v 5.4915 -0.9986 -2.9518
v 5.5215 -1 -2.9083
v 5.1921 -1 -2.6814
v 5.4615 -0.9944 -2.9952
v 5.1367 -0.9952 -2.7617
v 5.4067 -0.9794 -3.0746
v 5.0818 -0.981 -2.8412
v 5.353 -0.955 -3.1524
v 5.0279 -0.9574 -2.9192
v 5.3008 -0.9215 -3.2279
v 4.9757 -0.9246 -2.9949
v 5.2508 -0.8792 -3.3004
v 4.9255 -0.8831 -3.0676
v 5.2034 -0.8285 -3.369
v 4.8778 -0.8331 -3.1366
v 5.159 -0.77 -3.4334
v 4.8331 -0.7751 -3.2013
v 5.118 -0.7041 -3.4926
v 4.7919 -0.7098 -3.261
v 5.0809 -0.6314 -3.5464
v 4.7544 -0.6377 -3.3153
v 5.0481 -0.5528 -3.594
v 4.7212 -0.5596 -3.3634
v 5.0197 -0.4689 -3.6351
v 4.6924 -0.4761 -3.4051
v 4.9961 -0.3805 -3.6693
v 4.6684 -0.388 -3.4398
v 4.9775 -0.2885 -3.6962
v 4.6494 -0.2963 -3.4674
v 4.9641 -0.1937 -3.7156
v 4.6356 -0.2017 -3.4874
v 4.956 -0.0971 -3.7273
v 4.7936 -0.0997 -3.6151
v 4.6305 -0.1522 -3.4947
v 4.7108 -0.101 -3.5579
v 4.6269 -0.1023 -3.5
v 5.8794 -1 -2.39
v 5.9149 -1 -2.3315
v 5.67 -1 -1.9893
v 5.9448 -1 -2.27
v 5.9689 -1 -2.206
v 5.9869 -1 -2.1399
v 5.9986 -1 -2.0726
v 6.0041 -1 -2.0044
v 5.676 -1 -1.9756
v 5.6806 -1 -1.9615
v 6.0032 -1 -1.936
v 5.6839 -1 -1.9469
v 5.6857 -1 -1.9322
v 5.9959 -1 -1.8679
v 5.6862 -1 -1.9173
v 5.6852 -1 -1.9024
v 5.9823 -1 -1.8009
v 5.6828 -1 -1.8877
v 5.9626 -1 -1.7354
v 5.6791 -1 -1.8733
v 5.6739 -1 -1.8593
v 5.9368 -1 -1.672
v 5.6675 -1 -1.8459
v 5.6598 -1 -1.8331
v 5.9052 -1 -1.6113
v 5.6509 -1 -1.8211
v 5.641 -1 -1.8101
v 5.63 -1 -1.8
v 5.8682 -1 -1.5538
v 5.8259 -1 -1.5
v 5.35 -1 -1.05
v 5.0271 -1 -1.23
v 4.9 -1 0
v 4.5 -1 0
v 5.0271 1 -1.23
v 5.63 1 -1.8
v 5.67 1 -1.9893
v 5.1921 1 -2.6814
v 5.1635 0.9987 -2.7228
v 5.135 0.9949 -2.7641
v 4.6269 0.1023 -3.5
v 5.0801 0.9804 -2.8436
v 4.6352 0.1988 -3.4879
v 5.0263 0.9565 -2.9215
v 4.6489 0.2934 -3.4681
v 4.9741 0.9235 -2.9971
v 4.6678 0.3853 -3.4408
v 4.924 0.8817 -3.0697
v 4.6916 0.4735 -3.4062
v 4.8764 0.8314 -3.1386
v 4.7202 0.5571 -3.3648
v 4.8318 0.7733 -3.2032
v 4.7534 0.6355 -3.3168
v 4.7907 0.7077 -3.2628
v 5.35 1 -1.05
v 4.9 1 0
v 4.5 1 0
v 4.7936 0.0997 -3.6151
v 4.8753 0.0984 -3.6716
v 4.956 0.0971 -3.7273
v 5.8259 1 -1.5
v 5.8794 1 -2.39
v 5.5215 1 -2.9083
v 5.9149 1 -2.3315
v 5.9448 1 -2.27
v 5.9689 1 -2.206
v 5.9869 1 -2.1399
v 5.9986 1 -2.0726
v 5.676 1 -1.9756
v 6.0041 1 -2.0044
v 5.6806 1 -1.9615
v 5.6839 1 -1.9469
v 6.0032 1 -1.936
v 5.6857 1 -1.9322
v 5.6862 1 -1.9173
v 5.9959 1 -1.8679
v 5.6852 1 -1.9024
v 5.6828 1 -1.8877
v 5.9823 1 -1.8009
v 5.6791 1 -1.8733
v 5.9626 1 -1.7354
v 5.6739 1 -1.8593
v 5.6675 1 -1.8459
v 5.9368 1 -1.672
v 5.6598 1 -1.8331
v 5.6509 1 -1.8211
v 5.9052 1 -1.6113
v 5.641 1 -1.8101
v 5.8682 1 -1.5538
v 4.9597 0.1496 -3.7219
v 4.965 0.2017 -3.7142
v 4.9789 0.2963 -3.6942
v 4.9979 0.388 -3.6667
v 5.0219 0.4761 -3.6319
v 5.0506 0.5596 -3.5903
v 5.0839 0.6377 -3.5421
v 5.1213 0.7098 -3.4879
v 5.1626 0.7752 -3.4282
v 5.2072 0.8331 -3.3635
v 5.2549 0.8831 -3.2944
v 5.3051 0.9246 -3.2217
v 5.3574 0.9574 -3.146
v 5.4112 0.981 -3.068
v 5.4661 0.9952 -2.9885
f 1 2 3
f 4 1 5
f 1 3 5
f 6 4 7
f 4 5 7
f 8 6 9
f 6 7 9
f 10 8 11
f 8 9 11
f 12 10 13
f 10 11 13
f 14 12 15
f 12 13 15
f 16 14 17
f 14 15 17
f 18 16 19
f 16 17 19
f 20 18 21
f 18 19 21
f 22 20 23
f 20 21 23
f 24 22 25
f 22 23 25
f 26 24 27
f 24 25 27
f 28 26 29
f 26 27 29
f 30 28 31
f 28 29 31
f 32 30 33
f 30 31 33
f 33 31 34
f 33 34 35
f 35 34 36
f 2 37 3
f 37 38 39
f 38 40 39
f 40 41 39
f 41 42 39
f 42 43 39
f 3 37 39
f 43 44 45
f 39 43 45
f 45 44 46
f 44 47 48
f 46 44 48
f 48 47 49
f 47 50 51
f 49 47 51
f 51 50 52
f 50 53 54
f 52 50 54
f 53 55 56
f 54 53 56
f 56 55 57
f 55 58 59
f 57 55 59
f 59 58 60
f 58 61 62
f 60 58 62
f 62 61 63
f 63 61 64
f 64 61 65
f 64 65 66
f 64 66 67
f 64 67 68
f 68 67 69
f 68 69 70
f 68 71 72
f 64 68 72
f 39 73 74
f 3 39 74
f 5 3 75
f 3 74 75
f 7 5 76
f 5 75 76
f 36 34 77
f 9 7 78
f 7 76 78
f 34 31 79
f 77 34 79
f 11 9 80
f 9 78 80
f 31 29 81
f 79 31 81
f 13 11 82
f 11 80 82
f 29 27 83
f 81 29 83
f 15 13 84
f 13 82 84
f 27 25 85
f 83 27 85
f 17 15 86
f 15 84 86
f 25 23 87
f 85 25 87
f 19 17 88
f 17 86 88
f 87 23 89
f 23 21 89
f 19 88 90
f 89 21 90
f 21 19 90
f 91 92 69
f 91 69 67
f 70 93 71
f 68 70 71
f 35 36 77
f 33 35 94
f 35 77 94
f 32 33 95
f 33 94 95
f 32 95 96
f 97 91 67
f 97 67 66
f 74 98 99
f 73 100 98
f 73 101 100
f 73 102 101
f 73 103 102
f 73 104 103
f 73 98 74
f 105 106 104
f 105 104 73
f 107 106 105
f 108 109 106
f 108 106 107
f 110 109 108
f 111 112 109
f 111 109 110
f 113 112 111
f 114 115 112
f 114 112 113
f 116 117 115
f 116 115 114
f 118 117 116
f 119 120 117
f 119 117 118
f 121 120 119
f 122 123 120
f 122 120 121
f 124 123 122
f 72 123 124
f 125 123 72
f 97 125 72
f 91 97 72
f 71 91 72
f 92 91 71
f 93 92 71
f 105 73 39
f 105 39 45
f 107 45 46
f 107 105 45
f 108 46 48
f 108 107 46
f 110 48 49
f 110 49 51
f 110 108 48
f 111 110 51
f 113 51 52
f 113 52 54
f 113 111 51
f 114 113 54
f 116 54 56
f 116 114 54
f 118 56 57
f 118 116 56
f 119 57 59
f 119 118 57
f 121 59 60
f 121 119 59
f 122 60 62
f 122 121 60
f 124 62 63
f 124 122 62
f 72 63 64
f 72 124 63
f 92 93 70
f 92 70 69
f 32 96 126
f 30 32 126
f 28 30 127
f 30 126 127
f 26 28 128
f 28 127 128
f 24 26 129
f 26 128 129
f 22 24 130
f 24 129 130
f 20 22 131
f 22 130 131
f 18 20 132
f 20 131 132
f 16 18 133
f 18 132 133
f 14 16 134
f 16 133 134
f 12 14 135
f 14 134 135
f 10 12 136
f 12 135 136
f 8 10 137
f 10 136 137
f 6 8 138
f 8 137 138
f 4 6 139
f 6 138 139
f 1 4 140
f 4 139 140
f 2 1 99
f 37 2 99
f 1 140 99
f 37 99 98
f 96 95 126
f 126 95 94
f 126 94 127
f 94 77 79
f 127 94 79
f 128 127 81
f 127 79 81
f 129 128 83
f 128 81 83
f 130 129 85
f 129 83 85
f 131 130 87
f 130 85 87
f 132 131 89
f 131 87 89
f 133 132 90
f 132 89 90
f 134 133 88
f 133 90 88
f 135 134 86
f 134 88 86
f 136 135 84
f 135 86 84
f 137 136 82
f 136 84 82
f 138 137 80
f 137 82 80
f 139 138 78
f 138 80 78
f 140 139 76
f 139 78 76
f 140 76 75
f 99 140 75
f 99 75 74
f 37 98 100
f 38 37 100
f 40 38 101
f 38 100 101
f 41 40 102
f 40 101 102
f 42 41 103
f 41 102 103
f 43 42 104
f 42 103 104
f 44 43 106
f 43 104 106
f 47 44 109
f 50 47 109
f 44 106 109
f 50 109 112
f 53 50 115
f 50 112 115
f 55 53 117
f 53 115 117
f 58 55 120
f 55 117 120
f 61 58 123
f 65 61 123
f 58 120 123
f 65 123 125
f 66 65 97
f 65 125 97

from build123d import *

# Parameters (mm, degrees)
PAD008_DEPTH            = 0.45
BODY008_PLACEMENT_ANGLE = 34.55
PAD006_DEPTH            = 2


with BuildPart() as body008:
    # Sketch010 → Pad008 (new body)
    with BuildSketch(Plane.YZ):
        with BuildLine():
            ThreePointArc((-1, 1.01), (0, 0.01), (1, 1.010001))
            Line((1, 0), (1, 1.010001))
            Line((-1, 0), (1, 0))
            Line((-1, 1.01), (-1, 0))
        make_face()
    extrude(amount=PAD008_DEPTH)


with BuildPart() as body008_1:
    # Body008 placement: moved
    add(body008.part.moved(Location((4.6, 0, -3.5))).rotate(Axis((4.6, 0, -3.5), (0, 1, 0)), BODY008_PLACEMENT_ANGLE))


with BuildPart() as cut003:
    # Sketch008 → Pad006 (new body)
    with BuildSketch(Plane.XZ):
        with BuildLine():
            Line((4.5, 0), (4.9, 0))
            Line((4.9, 0), (5.35, -1.05))
            Line((5.35, -1.05), (5.82594, -1.5))
            ThreePointArc((5.879401, -2.39), (6.003164, -1.93596), (5.82594, -1.5))
            Line((4.956036, -3.727277), (5.879401, -2.39))
            Line((4.626878, -3.5), (4.956036, -3.727277))
            Line((5.67, -1.989282), (4.626878, -3.5))
            ThreePointArc((5.67, -1.989282), (5.68283, -1.887703), (5.63, -1.8))
            Line((5.027143, -1.23), (5.63, -1.8))
            Line((4.5, 0), (5.027143, -1.23))
        make_face()
    extrude(amount=PAD006_DEPTH)


with BuildPart() as cut003_1:
    # Body006 placement: moved
    add(cut003.part.moved(Location((0, 1, 0))))

    # Cut003: cut Body008
    add(body008_1.part, mode=Mode.SUBTRACT)


solid = cut003_1.part
